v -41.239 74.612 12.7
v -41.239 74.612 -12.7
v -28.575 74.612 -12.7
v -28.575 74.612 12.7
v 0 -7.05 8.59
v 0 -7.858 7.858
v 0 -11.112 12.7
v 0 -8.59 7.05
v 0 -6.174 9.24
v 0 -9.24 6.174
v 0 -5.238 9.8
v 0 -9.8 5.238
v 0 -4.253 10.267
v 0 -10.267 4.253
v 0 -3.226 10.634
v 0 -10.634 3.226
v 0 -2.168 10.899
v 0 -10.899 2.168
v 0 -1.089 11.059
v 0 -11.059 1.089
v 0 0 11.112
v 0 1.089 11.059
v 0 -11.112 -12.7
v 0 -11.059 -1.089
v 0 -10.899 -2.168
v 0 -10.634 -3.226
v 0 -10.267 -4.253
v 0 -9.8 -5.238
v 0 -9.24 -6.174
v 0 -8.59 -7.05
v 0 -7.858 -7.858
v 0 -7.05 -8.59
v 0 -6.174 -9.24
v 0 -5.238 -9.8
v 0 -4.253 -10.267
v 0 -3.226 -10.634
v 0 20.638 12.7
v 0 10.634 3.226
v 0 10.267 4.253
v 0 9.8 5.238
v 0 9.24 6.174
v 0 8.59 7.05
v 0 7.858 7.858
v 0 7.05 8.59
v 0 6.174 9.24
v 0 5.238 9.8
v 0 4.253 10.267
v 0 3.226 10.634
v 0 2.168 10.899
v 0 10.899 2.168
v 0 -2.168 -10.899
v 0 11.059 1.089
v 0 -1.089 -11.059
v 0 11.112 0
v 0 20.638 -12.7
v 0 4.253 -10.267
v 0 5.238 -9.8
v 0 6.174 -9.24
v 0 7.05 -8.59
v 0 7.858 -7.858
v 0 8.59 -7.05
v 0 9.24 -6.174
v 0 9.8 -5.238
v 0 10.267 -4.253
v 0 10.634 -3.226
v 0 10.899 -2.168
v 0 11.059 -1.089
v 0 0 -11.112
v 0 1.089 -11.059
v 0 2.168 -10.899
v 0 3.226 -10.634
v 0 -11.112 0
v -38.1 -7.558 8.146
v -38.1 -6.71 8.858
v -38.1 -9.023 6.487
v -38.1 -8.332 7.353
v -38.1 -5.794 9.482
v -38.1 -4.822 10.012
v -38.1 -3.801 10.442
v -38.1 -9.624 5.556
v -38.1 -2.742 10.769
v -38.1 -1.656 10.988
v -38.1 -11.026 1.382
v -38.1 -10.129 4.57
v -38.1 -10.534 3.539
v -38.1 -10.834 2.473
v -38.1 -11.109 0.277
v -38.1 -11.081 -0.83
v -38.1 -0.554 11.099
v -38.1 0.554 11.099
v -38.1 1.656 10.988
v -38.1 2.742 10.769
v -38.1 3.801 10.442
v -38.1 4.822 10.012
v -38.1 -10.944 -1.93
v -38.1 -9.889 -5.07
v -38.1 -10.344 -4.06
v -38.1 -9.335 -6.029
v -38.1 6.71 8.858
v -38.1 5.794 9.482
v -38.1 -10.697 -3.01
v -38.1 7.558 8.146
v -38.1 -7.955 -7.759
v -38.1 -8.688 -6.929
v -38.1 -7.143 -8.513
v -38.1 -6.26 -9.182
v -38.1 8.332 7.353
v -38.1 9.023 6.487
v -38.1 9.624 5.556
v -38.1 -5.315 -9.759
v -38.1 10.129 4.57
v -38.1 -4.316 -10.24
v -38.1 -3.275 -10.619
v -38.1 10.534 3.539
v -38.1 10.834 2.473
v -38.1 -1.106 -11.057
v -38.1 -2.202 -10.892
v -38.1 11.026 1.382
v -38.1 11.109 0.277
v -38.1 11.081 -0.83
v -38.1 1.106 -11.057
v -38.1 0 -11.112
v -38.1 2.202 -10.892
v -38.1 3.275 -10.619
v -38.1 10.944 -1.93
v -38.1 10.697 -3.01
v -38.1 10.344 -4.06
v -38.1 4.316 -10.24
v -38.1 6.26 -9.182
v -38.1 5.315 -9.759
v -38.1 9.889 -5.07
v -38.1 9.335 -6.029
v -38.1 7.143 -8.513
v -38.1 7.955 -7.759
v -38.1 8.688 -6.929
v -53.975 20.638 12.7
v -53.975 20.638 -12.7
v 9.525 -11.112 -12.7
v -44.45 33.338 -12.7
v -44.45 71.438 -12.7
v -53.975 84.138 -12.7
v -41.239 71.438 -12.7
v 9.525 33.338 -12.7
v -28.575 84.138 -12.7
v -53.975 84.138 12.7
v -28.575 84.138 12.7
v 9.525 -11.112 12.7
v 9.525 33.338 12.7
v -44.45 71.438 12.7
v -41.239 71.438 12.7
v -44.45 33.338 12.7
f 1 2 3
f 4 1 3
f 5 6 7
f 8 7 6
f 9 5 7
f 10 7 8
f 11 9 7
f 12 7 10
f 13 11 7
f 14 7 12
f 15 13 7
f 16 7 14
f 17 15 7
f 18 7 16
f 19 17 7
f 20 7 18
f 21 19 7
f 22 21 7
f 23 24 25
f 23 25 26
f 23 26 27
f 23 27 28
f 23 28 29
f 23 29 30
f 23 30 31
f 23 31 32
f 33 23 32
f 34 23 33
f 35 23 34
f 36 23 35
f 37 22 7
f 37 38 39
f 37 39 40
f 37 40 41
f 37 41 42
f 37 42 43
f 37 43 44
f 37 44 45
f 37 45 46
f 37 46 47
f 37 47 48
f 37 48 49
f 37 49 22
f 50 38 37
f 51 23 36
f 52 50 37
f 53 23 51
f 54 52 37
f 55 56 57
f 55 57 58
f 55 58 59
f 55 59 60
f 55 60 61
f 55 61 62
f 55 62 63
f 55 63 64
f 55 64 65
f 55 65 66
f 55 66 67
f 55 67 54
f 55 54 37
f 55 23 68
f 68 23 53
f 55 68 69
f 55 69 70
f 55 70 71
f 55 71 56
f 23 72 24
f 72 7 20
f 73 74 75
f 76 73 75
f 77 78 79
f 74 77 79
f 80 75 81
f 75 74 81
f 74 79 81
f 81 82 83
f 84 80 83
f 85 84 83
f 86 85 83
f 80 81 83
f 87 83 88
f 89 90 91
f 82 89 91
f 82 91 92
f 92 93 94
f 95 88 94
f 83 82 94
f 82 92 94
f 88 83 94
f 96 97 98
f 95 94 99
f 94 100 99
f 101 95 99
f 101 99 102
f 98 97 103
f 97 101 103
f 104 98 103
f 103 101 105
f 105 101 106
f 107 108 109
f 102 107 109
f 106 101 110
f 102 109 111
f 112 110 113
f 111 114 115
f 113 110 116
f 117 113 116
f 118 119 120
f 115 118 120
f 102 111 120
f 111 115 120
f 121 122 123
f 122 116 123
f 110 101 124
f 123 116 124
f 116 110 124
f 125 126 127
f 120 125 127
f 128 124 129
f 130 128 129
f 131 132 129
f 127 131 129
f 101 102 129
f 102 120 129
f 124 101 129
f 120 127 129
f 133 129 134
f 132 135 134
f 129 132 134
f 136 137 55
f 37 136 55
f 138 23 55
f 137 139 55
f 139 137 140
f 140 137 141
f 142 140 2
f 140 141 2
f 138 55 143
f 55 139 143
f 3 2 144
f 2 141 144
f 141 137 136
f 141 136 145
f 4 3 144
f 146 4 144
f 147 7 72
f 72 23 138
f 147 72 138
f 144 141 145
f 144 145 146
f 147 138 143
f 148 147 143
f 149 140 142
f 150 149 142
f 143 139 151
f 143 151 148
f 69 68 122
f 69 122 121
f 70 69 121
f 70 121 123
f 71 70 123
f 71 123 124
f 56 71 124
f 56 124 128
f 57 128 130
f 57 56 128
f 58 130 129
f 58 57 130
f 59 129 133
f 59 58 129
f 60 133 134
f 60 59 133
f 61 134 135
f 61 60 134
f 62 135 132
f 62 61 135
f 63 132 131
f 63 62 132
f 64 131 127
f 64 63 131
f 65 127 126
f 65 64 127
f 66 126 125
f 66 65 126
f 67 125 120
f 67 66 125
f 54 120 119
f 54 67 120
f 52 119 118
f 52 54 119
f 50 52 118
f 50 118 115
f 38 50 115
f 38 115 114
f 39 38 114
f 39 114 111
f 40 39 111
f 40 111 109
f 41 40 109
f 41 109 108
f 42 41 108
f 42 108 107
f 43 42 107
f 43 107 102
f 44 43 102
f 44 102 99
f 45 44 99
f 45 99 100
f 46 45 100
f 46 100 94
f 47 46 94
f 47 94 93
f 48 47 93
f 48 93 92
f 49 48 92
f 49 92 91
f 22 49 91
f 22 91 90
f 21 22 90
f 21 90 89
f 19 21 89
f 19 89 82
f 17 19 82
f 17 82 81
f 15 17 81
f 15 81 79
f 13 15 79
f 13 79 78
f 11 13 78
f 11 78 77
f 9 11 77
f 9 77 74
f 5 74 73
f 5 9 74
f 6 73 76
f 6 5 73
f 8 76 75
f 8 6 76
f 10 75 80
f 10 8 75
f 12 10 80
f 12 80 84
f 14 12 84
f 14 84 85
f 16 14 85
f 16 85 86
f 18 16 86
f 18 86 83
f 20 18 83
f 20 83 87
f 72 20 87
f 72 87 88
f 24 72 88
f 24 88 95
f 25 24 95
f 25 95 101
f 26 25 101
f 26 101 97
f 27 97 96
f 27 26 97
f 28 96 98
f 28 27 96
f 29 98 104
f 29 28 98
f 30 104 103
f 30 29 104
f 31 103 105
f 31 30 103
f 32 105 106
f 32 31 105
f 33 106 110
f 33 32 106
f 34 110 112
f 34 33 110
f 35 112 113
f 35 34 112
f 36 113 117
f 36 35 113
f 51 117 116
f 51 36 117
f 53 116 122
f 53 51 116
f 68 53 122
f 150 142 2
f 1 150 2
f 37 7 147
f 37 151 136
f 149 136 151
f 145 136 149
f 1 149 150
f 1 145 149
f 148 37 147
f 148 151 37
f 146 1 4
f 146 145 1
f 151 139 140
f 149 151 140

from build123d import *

# Parameters (mm, degrees)
SKETCH1_R                = 11.1125
BOSS_EXTRUDE1_DEPTH      = 38.1
BOSS_EXTRUDE2_DEPTH      = 12.7
BOSS_EXTRUDE2_DEPTH_BACK = 12.7
SKETCH2_W                = 9.525
SKETCH2_H                = 31.75
BOSS_EXTRUDE3_DEPTH      = 12.7
BOSS_EXTRUDE3_DEPTH_BACK = 12.7
SKETCH3_W                = 63.5
SKETCH3_H                = 12.7
BOSS_EXTRUDE4_DEPTH      = 12.7
BOSS_EXTRUDE4_DEPTH_BACK = 12.7
SKETCH4_W                = 9.525
SKETCH4_H                = 63.5
BOSS_EXTRUDE5_DEPTH      = 12.7
BOSS_EXTRUDE5_DEPTH_BACK = 12.7


with BuildPart() as part:
    # Sketch1 → Boss-Extrude1 (new body)
    with BuildSketch(Plane(origin=(0, 0, 0), x_dir=(0, 0, -1), z_dir=(1, 0, 0))):
        Circle(SKETCH1_R)
    extrude(amount=-BOSS_EXTRUDE1_DEPTH)

    # Sketch2 → Boss-Extrude2 (add, two sides: drawn at the far end of the back side and taken through both)
    with BuildSketch(Plane.XY.offset(-BOSS_EXTRUDE2_DEPTH_BACK)):
        with Locations((4.7625, 4.7625)):
            Rectangle(SKETCH2_W, SKETCH2_H)
    extrude(amount=BOSS_EXTRUDE2_DEPTH + BOSS_EXTRUDE2_DEPTH_BACK)

    # Sketch3 → Boss-Extrude3 (add, two sides: drawn at the far end of the back side and taken through both)
    with BuildSketch(Plane.XY.offset(-BOSS_EXTRUDE3_DEPTH_BACK)):
        with Locations((-22.225, 26.9875)):
            Rectangle(SKETCH3_W, SKETCH3_H)
    extrude(amount=BOSS_EXTRUDE3_DEPTH + BOSS_EXTRUDE3_DEPTH_BACK)

    # Sketch4 → Boss-Extrude4 (add, two sides: drawn at the far end of the back side and taken through both)
    with BuildSketch(Plane.XY.offset(-BOSS_EXTRUDE4_DEPTH_BACK)):
        with Locations((-49.2125, 52.3875)):
            Rectangle(SKETCH4_W, SKETCH4_H)
    extrude(amount=BOSS_EXTRUDE4_DEPTH + BOSS_EXTRUDE4_DEPTH_BACK)

    # Sketch5 → Boss-Extrude5 (add, two sides: drawn at the far end of the back side and taken through both)
    with BuildSketch(Plane.XY.offset(-BOSS_EXTRUDE5_DEPTH_BACK)):
        Polygon((-53.975, 71.4375), (-41.23944, 71.4375), (-41.23944, 74.6125), (-28.575, 74.6125), (-28.575, 84.1375), (-53.975, 84.1375), align=None)
    extrude(amount=BOSS_EXTRUDE5_DEPTH + BOSS_EXTRUDE5_DEPTH_BACK)


solid = part.part
